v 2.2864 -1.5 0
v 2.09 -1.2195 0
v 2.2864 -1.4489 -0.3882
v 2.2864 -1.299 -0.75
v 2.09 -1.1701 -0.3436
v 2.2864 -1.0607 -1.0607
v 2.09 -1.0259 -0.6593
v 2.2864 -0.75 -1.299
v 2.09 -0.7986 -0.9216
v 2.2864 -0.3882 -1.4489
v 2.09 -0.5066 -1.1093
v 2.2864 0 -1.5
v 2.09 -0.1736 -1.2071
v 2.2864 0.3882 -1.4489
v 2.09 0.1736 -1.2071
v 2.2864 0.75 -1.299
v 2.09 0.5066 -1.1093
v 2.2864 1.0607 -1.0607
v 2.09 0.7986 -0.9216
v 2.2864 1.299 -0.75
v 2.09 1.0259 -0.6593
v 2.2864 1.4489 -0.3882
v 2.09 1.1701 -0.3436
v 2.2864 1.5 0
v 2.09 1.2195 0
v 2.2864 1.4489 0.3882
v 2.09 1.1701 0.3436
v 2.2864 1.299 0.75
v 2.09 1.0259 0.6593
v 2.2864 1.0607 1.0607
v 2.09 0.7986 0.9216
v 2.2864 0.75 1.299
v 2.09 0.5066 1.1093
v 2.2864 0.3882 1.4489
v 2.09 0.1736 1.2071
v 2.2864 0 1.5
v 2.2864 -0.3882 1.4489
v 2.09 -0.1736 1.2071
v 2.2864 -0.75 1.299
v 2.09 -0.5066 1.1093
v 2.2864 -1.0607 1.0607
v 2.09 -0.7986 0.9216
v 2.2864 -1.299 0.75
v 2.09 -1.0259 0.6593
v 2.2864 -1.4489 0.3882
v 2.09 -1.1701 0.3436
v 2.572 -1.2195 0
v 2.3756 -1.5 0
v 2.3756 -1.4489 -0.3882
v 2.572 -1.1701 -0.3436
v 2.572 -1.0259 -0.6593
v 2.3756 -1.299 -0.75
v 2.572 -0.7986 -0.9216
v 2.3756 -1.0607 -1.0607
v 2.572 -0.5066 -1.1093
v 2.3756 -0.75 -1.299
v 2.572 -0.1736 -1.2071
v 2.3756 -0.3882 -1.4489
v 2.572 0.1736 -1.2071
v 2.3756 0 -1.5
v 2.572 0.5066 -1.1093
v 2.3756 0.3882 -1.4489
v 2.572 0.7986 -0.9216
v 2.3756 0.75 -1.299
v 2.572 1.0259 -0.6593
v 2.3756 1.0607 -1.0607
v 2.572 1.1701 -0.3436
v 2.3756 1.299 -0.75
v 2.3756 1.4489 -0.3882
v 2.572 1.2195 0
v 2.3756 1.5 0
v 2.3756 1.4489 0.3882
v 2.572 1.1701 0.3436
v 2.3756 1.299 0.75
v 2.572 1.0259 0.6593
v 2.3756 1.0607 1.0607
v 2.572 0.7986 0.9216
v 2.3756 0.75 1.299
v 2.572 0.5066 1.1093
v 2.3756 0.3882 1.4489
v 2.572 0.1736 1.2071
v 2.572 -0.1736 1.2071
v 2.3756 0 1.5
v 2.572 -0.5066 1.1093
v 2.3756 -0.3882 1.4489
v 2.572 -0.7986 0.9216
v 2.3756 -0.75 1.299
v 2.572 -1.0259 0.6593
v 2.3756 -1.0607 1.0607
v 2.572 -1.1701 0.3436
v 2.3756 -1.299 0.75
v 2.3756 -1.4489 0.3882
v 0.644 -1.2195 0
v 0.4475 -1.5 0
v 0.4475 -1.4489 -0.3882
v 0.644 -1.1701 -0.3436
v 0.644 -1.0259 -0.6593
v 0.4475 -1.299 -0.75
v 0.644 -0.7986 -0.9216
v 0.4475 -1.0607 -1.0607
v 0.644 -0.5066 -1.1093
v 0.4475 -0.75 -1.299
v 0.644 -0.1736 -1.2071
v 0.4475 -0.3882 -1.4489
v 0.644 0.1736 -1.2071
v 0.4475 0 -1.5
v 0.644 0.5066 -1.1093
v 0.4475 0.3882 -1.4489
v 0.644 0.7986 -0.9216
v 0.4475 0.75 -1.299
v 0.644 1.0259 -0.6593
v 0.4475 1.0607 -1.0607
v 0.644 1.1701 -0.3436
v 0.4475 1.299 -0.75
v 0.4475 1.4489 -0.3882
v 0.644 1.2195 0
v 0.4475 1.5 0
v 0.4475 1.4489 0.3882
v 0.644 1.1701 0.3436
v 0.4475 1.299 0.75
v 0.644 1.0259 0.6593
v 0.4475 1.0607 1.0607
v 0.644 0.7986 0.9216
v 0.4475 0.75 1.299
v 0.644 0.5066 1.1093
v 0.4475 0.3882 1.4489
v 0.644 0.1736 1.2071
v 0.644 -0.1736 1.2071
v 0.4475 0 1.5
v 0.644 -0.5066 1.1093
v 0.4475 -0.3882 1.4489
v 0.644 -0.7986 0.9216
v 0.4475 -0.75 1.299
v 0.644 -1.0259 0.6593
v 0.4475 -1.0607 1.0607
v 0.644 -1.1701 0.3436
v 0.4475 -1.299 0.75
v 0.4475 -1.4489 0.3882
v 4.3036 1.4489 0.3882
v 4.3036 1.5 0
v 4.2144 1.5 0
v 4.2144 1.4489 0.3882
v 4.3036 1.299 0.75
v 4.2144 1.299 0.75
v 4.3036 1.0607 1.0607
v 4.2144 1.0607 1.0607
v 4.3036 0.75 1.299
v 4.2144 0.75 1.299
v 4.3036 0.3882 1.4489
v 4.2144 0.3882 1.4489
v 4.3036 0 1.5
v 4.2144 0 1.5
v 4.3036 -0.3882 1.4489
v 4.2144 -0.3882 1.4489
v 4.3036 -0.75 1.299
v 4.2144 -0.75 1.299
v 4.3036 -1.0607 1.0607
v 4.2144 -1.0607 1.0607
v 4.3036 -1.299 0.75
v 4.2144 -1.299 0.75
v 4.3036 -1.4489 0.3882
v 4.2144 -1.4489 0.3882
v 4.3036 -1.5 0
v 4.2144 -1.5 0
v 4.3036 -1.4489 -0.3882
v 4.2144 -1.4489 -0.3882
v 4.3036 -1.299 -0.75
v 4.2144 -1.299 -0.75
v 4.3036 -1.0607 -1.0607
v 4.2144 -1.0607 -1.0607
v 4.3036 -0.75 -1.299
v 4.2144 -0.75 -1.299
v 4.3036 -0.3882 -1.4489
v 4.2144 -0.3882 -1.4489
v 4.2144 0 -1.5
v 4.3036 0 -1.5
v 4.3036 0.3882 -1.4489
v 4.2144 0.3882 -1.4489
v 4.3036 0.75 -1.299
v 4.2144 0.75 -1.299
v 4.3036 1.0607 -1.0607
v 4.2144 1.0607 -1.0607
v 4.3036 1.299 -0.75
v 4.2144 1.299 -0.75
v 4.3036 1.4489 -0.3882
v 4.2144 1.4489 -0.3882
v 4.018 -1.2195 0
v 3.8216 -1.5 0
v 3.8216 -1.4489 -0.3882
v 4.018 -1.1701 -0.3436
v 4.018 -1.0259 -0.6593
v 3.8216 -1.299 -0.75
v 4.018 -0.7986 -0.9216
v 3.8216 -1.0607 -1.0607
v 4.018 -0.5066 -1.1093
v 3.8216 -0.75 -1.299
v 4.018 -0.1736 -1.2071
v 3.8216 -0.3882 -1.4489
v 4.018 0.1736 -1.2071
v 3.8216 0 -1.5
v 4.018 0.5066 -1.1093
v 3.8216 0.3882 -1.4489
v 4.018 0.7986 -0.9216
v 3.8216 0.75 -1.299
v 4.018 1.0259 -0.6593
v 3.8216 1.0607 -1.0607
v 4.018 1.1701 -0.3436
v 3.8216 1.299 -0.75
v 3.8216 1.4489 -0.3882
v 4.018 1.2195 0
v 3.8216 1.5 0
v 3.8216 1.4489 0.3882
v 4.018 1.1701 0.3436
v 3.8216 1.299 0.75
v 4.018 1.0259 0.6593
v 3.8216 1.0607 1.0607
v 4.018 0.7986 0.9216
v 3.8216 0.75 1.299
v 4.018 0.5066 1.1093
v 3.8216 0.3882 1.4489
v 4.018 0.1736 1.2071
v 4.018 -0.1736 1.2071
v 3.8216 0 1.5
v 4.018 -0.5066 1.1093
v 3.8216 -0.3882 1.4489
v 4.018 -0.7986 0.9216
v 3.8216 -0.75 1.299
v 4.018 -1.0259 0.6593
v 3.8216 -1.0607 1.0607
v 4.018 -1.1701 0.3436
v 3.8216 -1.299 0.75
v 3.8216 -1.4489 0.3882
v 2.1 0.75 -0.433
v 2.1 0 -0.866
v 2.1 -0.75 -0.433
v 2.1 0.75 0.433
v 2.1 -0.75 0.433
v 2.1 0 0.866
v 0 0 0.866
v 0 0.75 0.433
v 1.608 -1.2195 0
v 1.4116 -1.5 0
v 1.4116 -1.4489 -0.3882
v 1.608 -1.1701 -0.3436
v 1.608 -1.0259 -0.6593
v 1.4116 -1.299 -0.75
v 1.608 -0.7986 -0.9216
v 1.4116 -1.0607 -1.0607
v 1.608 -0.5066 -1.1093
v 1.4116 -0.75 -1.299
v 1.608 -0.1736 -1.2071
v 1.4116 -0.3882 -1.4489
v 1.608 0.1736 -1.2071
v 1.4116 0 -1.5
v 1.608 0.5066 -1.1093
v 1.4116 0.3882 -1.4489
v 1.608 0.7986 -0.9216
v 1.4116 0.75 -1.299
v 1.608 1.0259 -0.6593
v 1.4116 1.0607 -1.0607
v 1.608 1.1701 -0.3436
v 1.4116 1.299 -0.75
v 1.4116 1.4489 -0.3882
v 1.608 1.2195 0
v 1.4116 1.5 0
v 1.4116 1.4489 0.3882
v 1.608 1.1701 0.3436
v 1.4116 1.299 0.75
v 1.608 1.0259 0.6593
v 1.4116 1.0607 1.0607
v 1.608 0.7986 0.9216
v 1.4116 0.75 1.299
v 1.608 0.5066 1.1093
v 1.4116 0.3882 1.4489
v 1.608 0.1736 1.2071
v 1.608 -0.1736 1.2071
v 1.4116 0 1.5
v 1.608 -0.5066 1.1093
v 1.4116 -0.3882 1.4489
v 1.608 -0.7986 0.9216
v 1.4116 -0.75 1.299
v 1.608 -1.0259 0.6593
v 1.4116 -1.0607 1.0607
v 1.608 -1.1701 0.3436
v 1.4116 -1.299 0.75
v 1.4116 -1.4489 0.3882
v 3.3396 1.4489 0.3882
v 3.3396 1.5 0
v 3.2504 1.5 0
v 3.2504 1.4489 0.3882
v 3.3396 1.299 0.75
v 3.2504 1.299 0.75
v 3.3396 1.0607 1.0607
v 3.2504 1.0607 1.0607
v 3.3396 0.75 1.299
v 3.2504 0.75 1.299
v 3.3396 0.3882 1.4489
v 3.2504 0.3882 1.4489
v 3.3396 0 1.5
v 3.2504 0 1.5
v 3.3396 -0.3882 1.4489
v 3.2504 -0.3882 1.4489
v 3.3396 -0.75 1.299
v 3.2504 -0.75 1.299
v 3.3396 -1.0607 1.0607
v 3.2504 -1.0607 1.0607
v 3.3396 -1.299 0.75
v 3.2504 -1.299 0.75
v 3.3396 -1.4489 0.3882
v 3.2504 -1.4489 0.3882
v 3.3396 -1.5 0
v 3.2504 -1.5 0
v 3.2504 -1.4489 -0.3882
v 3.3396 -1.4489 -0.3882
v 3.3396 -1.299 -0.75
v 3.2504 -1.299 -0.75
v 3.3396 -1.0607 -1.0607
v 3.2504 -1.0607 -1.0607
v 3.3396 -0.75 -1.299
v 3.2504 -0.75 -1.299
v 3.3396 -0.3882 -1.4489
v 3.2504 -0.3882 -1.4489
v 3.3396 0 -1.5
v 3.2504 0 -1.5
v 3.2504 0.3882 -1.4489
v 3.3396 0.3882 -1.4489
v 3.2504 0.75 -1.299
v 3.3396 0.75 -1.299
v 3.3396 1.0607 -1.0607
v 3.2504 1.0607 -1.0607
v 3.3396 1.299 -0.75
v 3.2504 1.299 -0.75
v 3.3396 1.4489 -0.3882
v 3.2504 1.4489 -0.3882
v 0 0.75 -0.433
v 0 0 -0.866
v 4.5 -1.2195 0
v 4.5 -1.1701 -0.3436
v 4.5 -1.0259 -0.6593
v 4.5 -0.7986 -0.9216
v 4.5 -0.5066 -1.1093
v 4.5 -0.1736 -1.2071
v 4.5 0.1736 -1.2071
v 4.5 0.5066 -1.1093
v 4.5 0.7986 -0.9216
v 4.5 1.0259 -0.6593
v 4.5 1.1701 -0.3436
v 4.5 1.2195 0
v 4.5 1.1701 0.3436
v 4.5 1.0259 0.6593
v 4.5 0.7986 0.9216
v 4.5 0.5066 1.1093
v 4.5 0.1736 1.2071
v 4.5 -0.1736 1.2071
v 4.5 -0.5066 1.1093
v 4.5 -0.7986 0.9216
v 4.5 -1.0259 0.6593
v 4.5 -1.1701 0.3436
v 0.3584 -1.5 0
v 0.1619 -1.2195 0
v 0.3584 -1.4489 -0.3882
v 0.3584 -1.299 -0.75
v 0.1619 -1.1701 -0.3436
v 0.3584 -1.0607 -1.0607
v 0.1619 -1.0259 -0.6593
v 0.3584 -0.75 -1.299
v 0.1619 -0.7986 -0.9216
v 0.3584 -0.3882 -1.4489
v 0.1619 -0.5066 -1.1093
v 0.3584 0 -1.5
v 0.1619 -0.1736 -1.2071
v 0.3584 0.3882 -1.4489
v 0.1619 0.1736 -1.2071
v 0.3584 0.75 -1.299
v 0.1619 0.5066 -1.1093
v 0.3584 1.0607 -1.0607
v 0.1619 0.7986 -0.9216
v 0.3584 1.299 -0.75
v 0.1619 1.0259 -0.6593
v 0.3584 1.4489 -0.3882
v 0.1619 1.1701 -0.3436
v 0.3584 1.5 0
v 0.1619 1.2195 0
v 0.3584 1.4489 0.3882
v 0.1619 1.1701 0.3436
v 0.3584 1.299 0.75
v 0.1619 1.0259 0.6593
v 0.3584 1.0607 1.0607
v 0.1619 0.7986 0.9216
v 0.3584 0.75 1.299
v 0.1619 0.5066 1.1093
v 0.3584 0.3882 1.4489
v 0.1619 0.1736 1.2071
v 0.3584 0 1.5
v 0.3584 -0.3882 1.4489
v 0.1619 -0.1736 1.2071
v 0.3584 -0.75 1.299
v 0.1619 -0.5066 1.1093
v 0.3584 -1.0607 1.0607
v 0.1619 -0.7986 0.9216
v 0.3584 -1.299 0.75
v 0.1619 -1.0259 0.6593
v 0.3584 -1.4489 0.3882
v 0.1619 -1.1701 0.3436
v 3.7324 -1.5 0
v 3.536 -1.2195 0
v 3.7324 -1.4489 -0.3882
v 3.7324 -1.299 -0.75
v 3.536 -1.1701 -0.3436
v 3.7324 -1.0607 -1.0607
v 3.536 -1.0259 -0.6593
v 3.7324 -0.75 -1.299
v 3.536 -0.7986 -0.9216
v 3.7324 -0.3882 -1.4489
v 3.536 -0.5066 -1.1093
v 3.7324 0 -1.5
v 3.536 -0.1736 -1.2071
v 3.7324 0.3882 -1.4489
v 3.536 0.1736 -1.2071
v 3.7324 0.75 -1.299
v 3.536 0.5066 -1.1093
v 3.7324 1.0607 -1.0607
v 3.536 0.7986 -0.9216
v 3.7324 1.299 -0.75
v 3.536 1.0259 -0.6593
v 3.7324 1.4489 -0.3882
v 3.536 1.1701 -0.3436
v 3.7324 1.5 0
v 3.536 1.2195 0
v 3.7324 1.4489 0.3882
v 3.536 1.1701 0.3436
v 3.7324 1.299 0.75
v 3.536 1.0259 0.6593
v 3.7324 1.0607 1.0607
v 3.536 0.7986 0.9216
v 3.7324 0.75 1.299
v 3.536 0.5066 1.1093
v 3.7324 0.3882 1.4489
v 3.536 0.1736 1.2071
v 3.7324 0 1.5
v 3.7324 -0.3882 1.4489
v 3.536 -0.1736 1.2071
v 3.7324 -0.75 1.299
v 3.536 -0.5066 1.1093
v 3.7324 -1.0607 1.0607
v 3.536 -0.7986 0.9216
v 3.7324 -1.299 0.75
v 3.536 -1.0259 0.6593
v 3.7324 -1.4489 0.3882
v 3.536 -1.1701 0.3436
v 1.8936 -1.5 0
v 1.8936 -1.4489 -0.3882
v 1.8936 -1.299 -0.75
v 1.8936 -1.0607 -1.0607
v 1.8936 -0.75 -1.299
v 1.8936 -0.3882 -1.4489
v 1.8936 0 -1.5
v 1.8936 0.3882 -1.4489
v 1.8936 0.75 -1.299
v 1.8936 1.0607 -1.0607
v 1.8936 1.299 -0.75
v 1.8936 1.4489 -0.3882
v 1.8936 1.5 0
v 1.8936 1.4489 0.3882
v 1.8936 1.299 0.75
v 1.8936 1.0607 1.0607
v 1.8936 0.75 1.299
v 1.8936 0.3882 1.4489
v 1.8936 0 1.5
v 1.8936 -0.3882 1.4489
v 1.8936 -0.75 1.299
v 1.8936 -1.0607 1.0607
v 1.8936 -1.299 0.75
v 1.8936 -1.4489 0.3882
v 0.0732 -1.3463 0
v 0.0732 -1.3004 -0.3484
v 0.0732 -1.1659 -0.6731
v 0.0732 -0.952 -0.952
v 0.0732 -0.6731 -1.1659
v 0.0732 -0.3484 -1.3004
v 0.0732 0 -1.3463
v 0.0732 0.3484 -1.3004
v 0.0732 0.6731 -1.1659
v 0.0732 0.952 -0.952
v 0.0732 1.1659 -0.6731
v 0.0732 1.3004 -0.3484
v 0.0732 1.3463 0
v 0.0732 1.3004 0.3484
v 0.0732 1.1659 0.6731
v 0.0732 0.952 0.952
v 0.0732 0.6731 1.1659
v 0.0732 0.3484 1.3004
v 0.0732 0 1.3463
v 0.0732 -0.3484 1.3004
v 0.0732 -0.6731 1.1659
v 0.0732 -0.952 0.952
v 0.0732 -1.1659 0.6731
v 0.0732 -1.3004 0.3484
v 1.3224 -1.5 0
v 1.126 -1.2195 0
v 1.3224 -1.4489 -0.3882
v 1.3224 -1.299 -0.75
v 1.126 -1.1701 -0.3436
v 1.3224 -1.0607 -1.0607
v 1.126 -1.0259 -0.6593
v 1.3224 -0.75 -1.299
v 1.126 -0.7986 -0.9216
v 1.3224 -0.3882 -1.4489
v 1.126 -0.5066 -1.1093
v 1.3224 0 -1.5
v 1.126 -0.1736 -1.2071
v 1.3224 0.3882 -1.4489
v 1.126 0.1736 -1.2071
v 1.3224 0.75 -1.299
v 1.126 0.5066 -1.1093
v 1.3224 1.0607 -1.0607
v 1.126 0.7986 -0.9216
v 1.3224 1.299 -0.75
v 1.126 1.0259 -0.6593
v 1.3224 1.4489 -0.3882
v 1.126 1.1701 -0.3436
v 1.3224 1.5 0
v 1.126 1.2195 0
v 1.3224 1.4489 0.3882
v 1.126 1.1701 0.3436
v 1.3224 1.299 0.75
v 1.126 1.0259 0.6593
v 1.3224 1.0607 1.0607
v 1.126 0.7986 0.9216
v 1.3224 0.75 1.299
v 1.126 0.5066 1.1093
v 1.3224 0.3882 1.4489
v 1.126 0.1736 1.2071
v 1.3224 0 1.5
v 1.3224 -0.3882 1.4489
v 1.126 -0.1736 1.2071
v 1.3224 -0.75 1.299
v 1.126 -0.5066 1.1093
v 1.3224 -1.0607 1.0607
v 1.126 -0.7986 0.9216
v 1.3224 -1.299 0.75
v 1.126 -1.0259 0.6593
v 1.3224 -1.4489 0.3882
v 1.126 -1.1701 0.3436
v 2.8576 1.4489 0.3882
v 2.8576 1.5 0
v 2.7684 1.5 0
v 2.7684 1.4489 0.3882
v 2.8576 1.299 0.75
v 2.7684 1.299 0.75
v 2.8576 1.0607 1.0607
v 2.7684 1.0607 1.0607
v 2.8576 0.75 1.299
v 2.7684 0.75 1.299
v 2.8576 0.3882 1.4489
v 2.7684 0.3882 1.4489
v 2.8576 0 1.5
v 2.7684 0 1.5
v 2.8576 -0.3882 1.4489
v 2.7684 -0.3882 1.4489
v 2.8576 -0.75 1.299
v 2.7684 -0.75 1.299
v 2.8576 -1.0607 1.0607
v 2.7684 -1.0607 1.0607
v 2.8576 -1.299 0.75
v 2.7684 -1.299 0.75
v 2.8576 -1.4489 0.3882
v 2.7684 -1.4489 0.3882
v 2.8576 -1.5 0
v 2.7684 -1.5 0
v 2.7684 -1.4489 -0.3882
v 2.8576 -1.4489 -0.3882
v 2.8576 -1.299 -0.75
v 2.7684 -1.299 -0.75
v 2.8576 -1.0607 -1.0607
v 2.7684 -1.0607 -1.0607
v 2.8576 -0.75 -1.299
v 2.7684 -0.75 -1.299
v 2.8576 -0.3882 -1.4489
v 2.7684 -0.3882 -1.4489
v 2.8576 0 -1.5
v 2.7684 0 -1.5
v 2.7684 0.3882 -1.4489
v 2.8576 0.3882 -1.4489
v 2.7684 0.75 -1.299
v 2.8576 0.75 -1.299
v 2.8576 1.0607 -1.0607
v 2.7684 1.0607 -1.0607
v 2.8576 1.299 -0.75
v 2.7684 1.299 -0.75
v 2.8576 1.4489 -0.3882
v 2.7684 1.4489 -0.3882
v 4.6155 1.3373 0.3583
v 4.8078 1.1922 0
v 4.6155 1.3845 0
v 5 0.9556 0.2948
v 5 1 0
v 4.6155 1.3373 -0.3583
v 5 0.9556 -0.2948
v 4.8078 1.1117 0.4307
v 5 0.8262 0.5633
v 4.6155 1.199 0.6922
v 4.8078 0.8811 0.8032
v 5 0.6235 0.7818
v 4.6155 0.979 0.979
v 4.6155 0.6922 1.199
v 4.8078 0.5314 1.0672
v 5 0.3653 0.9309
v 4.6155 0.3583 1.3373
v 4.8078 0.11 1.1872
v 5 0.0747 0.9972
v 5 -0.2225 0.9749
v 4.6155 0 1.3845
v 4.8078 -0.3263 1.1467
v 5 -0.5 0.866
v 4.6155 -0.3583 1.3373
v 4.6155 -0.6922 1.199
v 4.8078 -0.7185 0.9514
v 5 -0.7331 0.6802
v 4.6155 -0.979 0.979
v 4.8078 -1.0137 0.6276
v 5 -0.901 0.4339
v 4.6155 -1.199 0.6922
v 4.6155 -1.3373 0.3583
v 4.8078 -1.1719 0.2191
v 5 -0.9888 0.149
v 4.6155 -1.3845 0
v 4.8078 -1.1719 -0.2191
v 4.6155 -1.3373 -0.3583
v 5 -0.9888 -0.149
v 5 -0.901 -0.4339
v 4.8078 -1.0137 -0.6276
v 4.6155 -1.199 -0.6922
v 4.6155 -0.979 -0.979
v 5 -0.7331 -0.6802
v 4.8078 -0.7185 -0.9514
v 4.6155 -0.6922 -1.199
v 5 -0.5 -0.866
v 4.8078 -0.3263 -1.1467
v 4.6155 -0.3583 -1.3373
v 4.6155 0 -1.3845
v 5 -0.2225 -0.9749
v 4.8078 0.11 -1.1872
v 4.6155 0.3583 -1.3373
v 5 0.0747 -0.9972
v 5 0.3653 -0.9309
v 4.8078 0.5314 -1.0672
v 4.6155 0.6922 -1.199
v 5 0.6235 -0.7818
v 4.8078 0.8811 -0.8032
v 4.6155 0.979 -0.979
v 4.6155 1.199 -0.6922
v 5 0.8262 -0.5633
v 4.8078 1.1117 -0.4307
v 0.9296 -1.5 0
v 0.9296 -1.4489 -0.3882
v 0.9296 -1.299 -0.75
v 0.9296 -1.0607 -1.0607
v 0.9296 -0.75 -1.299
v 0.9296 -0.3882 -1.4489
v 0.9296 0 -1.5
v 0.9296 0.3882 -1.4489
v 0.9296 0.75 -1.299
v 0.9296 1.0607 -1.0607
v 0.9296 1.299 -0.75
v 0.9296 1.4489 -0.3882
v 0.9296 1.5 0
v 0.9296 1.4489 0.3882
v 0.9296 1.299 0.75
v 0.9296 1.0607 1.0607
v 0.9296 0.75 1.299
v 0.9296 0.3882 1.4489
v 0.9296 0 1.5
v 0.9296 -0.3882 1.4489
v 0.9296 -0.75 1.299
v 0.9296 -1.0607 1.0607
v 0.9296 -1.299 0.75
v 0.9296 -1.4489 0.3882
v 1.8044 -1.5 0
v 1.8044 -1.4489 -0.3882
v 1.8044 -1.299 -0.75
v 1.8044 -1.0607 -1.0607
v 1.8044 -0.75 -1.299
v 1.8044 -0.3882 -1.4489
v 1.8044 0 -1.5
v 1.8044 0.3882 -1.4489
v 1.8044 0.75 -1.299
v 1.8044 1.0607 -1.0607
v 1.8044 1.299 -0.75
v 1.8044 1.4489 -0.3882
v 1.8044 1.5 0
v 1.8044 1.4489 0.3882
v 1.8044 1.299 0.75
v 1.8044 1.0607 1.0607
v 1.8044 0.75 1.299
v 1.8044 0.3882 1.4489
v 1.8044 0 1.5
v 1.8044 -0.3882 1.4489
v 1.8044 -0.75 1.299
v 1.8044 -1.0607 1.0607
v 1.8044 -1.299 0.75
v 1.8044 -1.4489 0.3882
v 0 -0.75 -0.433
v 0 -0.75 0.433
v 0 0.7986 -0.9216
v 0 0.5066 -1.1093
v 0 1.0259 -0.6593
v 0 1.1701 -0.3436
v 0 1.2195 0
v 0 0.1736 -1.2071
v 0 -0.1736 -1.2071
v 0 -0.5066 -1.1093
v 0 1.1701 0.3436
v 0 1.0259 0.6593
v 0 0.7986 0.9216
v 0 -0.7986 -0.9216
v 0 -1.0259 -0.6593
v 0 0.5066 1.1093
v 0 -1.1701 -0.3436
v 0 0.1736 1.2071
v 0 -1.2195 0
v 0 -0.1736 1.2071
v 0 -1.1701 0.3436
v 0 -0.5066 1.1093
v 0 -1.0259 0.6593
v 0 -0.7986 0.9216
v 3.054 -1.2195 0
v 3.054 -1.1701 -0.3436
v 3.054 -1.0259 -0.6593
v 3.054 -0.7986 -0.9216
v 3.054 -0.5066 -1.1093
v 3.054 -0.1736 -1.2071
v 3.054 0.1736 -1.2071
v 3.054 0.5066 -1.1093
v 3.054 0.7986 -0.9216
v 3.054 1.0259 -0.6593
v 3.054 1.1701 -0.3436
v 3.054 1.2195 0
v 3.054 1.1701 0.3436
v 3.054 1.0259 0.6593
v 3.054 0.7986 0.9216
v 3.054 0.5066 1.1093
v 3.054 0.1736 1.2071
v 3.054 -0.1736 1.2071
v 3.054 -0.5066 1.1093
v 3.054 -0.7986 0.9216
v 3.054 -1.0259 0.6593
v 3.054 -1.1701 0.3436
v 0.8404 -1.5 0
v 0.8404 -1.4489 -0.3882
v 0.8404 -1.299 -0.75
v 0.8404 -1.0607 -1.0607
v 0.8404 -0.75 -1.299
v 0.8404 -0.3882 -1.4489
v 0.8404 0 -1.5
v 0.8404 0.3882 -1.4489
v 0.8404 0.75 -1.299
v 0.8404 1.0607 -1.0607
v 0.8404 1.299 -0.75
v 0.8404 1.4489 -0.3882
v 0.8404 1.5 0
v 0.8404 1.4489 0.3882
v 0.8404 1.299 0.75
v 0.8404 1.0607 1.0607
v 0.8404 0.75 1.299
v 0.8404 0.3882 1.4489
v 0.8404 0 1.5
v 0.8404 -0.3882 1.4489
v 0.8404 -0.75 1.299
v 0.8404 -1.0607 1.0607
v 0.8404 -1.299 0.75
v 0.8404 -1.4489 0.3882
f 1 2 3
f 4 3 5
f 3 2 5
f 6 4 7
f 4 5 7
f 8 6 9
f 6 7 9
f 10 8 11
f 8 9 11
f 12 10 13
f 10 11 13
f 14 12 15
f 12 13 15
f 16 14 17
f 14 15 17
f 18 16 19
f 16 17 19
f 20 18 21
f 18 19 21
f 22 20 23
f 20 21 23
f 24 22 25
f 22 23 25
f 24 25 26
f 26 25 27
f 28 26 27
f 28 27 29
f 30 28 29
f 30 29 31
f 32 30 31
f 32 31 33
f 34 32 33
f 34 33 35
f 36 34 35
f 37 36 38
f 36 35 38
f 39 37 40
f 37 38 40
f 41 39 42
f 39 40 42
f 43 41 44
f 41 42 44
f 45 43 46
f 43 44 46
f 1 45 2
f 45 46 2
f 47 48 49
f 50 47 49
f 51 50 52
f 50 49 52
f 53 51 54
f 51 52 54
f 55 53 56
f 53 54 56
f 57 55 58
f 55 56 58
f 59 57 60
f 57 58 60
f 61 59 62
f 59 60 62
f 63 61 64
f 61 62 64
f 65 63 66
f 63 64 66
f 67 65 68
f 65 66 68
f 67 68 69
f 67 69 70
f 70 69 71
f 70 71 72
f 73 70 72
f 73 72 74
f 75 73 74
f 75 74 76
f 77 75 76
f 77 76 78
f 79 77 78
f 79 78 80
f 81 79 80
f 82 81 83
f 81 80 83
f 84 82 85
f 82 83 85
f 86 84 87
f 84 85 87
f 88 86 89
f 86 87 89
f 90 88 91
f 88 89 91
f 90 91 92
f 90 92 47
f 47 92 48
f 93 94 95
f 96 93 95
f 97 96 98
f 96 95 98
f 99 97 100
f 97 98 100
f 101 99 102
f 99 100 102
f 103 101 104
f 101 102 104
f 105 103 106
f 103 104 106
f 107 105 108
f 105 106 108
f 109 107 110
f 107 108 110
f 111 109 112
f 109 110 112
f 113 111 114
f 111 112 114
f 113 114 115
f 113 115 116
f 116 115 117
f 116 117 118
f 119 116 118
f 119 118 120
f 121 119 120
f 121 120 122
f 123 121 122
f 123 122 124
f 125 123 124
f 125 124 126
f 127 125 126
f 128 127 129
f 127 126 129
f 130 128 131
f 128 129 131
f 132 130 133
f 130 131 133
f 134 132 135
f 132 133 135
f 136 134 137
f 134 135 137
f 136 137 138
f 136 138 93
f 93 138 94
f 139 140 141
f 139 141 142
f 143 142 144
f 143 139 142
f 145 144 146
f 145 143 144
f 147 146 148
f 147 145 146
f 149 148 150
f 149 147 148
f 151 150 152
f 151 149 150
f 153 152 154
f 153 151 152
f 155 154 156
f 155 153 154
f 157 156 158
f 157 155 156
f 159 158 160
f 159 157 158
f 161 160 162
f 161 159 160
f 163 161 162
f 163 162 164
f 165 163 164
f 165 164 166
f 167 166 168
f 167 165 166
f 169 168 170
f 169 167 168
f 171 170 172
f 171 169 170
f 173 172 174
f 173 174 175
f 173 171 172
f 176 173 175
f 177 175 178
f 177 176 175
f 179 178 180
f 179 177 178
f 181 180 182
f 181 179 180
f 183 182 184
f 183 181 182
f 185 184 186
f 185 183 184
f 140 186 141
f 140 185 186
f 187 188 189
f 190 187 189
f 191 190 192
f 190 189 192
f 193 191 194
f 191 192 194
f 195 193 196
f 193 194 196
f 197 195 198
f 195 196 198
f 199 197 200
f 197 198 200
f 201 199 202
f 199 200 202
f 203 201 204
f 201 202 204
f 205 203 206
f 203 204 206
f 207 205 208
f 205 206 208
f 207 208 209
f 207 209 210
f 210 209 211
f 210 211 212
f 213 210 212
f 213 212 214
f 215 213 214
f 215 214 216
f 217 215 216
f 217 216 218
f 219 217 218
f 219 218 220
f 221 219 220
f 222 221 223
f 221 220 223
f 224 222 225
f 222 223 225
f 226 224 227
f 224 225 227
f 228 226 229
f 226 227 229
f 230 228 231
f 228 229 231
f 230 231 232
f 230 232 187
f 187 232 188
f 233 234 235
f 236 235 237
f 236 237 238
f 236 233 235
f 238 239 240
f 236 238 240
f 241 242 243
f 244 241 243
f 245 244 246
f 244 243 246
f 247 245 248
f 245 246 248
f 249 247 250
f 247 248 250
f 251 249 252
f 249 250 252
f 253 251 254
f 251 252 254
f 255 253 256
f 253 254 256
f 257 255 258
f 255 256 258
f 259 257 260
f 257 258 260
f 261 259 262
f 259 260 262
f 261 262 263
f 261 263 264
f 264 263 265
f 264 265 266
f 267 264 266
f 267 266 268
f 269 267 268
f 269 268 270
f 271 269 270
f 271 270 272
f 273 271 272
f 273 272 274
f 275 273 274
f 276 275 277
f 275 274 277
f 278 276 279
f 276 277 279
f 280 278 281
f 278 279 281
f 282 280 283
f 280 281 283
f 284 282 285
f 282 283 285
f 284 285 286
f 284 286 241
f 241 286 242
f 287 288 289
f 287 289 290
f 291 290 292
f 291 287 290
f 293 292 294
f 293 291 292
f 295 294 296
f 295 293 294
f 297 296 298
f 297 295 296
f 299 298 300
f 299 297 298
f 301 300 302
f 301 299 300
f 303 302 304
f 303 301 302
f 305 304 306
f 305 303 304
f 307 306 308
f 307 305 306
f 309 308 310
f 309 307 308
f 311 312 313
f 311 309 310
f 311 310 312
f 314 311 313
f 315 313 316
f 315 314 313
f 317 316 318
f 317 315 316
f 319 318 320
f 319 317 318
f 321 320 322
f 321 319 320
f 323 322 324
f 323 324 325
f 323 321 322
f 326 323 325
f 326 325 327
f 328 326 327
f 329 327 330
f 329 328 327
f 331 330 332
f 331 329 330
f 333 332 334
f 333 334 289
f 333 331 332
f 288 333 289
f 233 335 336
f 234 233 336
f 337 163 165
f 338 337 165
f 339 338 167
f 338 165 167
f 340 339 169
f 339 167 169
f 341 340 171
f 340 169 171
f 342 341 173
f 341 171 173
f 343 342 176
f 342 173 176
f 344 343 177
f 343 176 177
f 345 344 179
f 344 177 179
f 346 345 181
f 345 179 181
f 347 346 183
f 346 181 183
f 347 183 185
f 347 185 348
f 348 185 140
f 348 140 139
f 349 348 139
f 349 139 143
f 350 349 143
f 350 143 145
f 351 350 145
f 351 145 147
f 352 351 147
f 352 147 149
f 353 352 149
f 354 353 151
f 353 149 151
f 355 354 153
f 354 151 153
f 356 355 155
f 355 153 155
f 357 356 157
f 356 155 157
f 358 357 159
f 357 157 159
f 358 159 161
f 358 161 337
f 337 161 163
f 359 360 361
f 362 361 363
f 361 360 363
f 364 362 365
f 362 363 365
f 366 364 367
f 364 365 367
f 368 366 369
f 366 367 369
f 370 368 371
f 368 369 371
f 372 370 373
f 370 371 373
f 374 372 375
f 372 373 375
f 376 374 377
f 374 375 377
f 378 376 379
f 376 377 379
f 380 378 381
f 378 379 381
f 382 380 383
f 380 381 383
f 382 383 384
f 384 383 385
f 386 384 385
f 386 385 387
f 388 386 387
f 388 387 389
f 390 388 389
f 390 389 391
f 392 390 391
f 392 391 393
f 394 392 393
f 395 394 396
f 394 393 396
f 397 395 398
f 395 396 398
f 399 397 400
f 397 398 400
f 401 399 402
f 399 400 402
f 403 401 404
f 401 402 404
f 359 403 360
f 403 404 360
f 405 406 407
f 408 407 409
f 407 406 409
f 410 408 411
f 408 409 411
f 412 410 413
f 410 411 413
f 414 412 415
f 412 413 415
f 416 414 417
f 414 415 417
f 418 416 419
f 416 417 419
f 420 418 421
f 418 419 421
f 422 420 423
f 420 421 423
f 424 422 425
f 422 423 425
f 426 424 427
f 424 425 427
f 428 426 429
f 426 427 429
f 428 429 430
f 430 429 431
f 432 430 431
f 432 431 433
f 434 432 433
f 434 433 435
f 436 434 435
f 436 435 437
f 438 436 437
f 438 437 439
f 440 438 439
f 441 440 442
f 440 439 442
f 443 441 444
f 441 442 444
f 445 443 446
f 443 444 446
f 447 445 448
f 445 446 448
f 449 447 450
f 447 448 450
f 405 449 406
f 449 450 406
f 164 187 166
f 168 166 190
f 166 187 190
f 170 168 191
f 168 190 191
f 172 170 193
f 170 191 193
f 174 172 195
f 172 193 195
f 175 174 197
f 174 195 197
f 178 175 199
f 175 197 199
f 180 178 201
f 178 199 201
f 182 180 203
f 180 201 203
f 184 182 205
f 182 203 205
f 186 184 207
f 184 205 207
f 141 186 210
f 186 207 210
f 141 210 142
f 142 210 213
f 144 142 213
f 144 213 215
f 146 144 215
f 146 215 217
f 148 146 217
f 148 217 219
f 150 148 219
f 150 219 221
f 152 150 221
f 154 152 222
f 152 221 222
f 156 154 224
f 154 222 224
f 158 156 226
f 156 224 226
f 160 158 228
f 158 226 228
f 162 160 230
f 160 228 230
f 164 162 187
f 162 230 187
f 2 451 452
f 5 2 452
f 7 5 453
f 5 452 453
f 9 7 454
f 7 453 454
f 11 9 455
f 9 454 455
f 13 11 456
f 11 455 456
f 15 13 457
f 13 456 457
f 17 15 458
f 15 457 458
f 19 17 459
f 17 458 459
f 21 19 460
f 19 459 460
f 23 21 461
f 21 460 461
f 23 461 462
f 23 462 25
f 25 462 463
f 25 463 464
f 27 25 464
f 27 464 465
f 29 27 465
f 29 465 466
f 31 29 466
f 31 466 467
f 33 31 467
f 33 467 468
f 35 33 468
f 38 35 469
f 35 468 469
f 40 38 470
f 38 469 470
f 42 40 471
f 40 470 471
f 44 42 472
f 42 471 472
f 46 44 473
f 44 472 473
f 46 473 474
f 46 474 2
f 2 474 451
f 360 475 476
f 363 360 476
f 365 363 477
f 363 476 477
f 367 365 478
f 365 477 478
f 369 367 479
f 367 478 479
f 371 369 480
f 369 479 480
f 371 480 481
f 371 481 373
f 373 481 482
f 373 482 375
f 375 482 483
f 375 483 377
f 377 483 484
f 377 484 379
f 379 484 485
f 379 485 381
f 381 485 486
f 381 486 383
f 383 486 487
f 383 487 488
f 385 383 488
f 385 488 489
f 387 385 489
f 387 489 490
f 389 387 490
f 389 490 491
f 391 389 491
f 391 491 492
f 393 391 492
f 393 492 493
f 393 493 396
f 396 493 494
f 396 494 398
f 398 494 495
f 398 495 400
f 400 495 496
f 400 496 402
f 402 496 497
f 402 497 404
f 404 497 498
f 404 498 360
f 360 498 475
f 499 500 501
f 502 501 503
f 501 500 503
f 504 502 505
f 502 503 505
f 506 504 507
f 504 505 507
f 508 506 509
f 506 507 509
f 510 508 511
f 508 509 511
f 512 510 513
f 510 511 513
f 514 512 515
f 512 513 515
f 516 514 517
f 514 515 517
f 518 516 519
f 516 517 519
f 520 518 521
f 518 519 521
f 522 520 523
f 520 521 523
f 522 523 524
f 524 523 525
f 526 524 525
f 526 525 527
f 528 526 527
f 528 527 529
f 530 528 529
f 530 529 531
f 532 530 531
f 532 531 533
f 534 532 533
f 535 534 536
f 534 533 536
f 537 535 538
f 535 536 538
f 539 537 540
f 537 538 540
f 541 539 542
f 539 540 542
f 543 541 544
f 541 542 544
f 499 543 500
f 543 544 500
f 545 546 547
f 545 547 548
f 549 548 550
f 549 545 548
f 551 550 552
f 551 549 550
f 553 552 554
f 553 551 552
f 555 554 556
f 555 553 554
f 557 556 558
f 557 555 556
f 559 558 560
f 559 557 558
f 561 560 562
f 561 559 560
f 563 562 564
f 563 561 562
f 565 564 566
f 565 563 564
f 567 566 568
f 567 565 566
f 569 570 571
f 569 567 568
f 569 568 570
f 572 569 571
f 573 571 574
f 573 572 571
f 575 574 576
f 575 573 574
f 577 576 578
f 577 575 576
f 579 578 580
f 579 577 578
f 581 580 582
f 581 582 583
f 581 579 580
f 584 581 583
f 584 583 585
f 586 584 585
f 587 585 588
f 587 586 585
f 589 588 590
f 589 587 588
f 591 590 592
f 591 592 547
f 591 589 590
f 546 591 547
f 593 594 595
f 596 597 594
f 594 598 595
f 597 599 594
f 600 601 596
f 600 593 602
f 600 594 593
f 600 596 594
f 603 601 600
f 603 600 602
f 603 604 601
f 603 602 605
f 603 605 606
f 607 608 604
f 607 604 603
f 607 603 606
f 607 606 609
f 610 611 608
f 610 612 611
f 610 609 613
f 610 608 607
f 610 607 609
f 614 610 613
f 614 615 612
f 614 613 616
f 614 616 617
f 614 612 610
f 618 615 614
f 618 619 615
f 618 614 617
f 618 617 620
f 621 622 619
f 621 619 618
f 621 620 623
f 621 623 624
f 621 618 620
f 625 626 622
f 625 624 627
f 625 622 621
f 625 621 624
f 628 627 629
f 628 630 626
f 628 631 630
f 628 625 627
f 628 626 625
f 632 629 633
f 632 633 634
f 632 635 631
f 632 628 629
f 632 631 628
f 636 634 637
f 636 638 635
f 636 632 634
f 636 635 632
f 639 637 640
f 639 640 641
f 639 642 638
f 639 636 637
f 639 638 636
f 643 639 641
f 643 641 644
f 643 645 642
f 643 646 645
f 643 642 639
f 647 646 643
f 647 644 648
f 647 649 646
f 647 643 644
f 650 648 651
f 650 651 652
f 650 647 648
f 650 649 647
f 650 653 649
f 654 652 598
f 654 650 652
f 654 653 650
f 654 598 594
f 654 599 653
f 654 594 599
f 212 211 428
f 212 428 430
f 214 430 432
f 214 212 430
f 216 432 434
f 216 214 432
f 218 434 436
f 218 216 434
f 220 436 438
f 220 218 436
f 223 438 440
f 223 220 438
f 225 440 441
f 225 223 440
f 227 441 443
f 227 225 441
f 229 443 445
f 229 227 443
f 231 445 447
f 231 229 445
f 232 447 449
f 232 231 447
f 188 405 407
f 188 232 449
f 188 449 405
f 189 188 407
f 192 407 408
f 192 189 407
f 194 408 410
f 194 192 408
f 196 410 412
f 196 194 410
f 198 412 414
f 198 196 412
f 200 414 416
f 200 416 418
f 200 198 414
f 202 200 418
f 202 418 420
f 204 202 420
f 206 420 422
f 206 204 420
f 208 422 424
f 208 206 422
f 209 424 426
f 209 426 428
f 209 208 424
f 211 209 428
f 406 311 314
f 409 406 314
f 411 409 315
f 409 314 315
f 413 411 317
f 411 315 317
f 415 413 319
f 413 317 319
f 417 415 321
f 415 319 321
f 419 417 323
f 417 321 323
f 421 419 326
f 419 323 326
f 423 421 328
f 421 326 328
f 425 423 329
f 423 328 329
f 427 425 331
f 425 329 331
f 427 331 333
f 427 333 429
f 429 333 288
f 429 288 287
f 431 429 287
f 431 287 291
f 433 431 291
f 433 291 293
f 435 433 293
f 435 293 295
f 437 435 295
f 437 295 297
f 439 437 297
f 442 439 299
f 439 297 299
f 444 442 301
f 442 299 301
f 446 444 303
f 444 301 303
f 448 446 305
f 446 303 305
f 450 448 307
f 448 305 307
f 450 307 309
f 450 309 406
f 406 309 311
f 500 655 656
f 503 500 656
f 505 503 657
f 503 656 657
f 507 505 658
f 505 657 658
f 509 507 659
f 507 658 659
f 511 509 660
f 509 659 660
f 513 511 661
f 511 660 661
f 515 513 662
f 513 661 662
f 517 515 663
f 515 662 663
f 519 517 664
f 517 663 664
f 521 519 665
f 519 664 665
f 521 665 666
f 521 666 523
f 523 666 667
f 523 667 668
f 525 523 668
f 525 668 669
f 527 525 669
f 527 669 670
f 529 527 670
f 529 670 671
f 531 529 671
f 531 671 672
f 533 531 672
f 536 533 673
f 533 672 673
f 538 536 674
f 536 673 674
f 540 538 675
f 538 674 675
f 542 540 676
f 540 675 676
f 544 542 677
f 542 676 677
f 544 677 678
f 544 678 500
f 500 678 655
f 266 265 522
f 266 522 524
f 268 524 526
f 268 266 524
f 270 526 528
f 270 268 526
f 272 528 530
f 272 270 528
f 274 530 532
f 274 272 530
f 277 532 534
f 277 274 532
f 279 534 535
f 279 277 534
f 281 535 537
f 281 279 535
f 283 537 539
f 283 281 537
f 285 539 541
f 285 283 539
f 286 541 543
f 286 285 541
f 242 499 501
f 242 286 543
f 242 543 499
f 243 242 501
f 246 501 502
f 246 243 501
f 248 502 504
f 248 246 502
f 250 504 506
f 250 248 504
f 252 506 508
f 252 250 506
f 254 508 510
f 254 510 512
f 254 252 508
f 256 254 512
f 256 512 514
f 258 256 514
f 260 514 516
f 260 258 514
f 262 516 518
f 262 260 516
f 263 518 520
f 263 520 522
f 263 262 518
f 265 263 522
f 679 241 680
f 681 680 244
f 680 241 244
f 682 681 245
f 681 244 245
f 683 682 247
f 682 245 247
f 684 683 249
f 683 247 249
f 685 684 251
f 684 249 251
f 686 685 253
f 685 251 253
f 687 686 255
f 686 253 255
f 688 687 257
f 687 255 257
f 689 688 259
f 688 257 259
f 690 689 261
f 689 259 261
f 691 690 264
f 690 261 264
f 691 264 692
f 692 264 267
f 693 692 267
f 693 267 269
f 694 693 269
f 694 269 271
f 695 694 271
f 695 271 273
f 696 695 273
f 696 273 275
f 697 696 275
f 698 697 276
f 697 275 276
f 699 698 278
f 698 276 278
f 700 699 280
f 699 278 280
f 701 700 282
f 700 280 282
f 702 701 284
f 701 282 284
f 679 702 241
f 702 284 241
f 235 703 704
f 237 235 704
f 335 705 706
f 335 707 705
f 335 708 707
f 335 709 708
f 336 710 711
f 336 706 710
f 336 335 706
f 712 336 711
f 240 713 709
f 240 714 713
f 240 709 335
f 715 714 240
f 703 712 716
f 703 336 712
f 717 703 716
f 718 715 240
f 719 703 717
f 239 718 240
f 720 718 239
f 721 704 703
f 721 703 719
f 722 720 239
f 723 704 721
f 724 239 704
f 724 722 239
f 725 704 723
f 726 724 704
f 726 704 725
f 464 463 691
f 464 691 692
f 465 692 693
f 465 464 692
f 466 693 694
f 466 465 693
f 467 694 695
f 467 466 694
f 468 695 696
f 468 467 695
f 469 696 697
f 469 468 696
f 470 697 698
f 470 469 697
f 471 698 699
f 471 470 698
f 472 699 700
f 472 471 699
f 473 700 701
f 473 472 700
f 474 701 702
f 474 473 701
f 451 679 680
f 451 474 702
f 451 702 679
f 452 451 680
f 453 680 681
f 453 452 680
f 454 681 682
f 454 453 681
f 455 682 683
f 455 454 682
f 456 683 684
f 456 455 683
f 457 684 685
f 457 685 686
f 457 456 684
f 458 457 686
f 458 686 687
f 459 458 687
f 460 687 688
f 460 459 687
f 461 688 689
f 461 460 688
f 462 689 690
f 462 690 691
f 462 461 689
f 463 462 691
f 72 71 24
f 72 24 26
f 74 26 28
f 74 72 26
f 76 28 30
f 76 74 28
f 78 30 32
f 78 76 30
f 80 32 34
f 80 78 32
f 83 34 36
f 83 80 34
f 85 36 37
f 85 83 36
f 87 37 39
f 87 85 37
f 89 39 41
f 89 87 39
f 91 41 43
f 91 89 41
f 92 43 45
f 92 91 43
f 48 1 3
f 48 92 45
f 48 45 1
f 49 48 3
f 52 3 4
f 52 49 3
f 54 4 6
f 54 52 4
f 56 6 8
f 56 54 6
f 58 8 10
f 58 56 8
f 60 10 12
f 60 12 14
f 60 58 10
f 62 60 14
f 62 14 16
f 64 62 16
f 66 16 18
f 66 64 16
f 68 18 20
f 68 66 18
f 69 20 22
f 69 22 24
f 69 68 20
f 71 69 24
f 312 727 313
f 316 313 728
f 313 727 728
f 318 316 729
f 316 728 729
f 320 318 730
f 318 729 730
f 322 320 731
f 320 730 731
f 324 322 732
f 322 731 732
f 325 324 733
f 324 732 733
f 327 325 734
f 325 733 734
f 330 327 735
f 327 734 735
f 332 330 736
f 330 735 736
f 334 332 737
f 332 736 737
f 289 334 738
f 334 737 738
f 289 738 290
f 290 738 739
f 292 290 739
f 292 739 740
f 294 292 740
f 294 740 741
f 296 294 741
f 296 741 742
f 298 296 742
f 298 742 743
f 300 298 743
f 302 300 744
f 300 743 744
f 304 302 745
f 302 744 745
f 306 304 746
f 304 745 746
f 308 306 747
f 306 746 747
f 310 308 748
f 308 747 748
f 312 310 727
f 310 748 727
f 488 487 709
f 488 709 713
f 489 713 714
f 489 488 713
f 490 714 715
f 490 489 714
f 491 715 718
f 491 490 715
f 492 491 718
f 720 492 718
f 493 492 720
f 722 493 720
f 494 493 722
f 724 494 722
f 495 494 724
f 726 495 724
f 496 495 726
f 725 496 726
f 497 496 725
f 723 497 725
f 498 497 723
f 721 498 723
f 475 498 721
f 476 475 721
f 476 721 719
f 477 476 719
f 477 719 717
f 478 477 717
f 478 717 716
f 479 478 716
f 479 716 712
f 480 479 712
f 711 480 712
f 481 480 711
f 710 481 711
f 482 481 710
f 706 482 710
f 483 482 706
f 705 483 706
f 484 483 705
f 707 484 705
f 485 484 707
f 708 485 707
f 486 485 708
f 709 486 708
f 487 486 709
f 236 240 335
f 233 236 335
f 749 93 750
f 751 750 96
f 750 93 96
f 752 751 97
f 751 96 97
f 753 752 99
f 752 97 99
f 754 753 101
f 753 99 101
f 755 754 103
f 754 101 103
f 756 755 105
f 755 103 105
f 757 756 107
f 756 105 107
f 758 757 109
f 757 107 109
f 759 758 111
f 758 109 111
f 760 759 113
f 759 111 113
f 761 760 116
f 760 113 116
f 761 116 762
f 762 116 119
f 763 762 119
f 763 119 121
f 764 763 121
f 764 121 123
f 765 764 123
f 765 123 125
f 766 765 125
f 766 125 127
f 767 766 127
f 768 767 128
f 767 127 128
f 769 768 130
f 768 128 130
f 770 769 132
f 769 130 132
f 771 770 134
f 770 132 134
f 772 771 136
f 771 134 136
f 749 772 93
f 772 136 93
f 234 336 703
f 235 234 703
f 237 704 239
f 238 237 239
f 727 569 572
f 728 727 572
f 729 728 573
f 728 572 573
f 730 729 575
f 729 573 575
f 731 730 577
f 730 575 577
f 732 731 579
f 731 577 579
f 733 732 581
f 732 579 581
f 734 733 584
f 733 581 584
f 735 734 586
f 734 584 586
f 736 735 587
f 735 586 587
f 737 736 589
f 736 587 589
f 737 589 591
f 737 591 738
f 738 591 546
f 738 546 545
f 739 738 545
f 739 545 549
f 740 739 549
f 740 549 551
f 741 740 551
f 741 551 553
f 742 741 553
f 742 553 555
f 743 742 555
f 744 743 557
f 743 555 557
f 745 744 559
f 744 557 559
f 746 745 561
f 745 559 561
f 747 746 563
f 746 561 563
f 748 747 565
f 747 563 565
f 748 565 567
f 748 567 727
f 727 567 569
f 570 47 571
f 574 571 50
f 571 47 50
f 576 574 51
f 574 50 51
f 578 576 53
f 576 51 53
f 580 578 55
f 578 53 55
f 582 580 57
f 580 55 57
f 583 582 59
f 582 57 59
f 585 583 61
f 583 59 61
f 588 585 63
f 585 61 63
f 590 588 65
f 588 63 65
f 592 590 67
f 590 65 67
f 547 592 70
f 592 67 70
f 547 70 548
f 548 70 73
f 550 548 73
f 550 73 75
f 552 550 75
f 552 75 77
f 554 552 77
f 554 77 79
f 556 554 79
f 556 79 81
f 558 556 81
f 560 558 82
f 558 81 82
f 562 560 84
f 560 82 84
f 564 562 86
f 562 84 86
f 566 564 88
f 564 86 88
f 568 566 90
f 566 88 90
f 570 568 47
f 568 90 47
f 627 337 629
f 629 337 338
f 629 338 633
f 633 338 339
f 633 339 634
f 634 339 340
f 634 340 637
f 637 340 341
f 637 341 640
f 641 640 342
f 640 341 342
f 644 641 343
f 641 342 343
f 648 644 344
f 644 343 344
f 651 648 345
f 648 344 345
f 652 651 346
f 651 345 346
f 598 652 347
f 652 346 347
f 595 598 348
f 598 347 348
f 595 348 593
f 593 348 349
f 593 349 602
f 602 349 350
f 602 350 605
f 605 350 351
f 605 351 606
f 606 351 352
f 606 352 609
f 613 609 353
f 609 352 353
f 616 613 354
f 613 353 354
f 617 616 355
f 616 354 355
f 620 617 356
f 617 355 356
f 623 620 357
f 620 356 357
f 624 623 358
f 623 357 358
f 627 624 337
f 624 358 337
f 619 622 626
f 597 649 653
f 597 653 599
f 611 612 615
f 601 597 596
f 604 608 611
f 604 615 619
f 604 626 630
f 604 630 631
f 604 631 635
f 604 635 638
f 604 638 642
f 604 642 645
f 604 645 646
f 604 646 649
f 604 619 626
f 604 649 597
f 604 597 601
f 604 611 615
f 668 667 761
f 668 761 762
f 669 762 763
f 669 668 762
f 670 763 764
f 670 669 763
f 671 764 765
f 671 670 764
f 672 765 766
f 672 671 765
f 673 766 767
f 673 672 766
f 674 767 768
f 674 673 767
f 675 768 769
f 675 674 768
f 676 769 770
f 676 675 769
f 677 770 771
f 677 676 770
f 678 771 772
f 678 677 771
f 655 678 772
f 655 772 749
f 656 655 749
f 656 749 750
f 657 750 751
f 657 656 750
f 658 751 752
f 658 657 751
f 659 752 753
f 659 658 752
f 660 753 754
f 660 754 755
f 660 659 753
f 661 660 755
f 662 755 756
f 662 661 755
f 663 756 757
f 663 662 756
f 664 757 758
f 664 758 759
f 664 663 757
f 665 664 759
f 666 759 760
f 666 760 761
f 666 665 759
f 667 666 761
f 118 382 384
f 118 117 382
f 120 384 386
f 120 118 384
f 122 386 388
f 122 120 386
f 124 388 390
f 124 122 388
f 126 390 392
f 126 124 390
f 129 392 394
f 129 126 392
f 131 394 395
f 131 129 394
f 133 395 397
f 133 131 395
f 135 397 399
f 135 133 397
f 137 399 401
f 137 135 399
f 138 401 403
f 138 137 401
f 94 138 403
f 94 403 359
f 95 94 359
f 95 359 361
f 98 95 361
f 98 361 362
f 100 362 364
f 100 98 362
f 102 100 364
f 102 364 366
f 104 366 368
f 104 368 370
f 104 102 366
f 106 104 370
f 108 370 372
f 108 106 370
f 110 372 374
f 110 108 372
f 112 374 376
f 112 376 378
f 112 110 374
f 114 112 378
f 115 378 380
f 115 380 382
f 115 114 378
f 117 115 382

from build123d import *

# Parameters (mm, degrees)
HEX_2_DEPTH     = 2.1
THDSCHPAT_COUNT = 10
THDSCHPAT_PITCH = 0.482005923


with BuildPart() as part:
    # BodySke → BaseBody (revolve)
    with BuildSketch(Plane.XY):
        Polygon((0, 0), (0, 1.2195), (0.161946751, 1.5), (4.5, 1.5), (5, 1), (5, 0), align=None)
    revolve(axis=Axis((-12.7, 0, 0), (1, 0, 0)))

    # Sketch2 → Hex 2 (cut)
    with BuildSketch(Plane.ZY):
        Polygon((0.433012702, 0.75), (-0.433012702, 0.75), (-0.866025404, 0), (-0.433012702, -0.75), (0.433012702, -0.75), (0.866025404, 0), align=None)
    extrude(amount=-HEX_2_DEPTH, mode=Mode.SUBTRACT)

    # ThdSchSke → ThreadSchematic (revolve, cut)
    with BuildSketch(Plane.XY):
        Polygon((0.161946751, -1.2195), (-0.034461464, -1.5), (-0.034461464, -1.875), (0.358354965, -1.875), (0.358354965, -1.5), align=None)
    threadschematic = revolve(axis=Axis((-3.175, 0, 0), (1, 0, 0)), mode=Mode.SUBTRACT)

    # ThdSchPat: ThreadSchematic ×10
    with Locations(*[(i * THDSCHPAT_PITCH, 0, 0) for i in range(1, THDSCHPAT_COUNT)]):
        add(threadschematic, mode=Mode.SUBTRACT)


solid = part.part
